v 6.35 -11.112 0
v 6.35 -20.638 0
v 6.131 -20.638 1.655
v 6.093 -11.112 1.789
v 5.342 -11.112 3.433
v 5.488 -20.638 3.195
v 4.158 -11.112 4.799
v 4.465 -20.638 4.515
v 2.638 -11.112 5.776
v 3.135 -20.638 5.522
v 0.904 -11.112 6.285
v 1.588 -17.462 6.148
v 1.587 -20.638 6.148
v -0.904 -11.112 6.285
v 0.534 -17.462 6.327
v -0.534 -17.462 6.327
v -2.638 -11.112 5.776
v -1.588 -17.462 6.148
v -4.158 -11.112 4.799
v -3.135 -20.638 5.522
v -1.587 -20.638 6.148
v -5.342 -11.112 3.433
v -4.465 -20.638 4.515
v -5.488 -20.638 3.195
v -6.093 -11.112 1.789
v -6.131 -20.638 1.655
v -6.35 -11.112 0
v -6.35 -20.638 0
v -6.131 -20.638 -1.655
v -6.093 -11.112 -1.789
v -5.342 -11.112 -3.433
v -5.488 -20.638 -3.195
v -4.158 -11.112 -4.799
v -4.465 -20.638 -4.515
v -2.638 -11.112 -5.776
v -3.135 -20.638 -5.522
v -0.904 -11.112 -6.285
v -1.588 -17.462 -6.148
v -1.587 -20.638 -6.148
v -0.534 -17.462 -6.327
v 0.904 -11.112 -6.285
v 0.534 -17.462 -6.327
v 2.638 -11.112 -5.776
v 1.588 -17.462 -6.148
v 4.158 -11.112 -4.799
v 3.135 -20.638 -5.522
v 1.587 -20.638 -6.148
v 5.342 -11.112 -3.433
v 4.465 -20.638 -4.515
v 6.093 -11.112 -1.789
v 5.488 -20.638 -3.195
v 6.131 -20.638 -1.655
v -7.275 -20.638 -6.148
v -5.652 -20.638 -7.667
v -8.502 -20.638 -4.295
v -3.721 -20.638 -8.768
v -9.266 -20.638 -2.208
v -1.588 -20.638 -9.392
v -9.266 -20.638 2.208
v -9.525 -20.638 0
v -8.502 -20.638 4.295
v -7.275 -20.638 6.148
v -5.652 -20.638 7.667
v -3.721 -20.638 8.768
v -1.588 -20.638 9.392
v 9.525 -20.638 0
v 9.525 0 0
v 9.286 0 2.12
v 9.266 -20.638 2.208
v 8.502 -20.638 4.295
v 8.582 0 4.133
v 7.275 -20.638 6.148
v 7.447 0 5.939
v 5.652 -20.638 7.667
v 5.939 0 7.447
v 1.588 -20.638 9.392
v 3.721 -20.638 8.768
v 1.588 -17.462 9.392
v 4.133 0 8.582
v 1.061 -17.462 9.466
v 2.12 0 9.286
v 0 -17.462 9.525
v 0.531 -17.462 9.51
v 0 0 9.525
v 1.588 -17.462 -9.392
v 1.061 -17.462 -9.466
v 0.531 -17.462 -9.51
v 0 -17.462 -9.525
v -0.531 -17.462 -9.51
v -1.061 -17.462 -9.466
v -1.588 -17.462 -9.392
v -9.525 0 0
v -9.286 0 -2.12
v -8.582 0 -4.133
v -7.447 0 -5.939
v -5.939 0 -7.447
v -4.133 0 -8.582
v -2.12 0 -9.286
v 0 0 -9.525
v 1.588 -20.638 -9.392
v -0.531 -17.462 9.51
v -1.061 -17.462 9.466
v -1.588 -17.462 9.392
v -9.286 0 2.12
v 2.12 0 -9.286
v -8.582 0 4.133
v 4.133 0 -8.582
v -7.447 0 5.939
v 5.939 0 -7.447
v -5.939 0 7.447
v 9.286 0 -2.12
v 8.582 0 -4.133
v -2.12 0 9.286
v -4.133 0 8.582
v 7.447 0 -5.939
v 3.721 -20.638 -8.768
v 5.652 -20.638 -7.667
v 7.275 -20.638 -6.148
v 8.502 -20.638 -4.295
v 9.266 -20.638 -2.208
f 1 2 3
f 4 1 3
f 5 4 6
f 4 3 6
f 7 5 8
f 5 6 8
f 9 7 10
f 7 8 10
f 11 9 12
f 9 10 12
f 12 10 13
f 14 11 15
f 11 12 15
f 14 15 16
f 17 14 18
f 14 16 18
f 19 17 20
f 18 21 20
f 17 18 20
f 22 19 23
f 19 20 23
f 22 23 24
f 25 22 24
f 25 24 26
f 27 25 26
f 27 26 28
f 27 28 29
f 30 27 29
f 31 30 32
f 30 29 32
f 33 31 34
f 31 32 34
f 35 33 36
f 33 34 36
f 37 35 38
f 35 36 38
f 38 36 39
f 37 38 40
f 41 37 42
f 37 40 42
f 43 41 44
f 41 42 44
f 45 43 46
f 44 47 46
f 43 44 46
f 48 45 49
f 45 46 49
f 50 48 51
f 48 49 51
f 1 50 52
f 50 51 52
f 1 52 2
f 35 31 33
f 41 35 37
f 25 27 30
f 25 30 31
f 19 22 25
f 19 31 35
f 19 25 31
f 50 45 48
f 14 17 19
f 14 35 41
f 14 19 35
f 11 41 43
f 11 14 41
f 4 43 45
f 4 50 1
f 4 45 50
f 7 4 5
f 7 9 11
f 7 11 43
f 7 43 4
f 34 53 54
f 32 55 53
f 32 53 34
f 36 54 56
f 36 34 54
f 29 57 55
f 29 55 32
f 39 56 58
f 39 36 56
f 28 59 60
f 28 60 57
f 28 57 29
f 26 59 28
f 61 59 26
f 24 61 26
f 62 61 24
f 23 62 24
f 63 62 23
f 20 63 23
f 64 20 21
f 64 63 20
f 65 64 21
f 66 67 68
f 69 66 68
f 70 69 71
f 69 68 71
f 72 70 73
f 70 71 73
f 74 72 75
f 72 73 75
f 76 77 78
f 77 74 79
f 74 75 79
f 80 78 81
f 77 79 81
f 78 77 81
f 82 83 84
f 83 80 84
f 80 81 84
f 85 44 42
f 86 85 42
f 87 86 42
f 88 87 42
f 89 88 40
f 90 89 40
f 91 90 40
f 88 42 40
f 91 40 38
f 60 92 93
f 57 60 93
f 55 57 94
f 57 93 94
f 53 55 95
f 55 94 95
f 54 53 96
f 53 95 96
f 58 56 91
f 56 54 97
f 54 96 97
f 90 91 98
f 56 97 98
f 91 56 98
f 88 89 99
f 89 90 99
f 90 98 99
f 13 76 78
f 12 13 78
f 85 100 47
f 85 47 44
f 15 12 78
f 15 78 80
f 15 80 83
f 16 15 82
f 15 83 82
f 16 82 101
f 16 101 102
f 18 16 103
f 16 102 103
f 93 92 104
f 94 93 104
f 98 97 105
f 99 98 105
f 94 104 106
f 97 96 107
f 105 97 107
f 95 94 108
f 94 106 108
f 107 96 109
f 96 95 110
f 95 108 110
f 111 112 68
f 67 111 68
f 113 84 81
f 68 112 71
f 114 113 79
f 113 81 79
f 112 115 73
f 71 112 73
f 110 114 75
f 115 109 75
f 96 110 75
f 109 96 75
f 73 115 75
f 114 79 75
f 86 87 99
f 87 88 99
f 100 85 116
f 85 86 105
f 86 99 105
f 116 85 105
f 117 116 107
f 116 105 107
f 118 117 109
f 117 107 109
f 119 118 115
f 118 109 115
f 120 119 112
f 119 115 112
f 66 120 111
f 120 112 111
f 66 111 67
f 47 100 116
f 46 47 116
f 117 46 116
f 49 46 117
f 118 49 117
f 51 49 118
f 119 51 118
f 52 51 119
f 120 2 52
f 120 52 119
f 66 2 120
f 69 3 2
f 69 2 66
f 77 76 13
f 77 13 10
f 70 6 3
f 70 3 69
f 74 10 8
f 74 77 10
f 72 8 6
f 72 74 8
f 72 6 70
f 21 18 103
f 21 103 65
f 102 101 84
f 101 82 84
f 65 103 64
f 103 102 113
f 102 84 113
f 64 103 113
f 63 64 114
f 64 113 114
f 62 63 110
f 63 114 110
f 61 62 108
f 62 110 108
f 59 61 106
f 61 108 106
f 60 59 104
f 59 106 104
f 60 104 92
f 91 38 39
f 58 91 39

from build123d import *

# Parameters (mm, degrees)
F0_W     = 19.05
F0_H     = 19.05
F1_DEPTH = 20.6375
F2_R     = 6.35
F3_DEPTH = 9.525
F5_DEPTH = 25.4
F7_DEPTH = 25.4


with BuildPart() as f1:
    # F0 (on Front) → F1 (new body)
    with BuildSketch(Plane.XZ):
        Rectangle(F0_W, F0_H)
    extrude(amount=F1_DEPTH)

    # F2 (on face) → F3 (cut)
    with BuildSketch(Plane.XZ.offset(20.6375)):
        Circle(F2_R)
    extrude(amount=-F3_DEPTH, mode=Mode.SUBTRACT)

    # F4 (on face) → F5 (cut)
    with BuildSketch(Plane.XY.offset(9.525)):
        Polygon((-1.5875, -20.6375), (0, -20.6375), (1.5875, -20.6375), (1.5875, -17.4625), (-1.5875, -17.4625), align=None)
    extrude(amount=-F5_DEPTH, mode=Mode.SUBTRACT)

    # F6 (on face) → F7 (cut)
    with BuildSketch(Plane(origin=(0, 0, 0), x_dir=(-1, 0, 0), z_dir=(0, 1, 0))):
        with BuildLine():
            ThreePointArc((-9.525, 0), (-6.7351920908, 6.7351920908), (0, 9.525))
            Line((0, 9.525), (-9.525, 9.525))
            Line((-9.525, 9.525), (-9.525, 0))
        make_face()
        with BuildLine():
            ThreePointArc((0, 9.525), (6.7351920908, 6.7351920908), (9.525, 0))
            Line((9.525, 0), (9.525, 9.525))
            Line((9.525, 9.525), (0, 9.525))
        make_face()
        with BuildLine():
            Line((-9.525, -9.525), (0, -9.525))
            ThreePointArc((0, -9.525), (-6.7351920908, -6.7351920908), (-9.525, 0))
            Line((-9.525, 0), (-9.525, -9.525))
        make_face()
        with BuildLine():
            Line((9.525, -9.525), (9.525, 0))
            ThreePointArc((9.525, 0), (6.7351920908, -6.7351920908), (0, -9.525))
            Line((0, -9.525), (9.525, -9.525))
        make_face()
    extrude(amount=-F7_DEPTH, mode=Mode.SUBTRACT)


solid = f1.part
